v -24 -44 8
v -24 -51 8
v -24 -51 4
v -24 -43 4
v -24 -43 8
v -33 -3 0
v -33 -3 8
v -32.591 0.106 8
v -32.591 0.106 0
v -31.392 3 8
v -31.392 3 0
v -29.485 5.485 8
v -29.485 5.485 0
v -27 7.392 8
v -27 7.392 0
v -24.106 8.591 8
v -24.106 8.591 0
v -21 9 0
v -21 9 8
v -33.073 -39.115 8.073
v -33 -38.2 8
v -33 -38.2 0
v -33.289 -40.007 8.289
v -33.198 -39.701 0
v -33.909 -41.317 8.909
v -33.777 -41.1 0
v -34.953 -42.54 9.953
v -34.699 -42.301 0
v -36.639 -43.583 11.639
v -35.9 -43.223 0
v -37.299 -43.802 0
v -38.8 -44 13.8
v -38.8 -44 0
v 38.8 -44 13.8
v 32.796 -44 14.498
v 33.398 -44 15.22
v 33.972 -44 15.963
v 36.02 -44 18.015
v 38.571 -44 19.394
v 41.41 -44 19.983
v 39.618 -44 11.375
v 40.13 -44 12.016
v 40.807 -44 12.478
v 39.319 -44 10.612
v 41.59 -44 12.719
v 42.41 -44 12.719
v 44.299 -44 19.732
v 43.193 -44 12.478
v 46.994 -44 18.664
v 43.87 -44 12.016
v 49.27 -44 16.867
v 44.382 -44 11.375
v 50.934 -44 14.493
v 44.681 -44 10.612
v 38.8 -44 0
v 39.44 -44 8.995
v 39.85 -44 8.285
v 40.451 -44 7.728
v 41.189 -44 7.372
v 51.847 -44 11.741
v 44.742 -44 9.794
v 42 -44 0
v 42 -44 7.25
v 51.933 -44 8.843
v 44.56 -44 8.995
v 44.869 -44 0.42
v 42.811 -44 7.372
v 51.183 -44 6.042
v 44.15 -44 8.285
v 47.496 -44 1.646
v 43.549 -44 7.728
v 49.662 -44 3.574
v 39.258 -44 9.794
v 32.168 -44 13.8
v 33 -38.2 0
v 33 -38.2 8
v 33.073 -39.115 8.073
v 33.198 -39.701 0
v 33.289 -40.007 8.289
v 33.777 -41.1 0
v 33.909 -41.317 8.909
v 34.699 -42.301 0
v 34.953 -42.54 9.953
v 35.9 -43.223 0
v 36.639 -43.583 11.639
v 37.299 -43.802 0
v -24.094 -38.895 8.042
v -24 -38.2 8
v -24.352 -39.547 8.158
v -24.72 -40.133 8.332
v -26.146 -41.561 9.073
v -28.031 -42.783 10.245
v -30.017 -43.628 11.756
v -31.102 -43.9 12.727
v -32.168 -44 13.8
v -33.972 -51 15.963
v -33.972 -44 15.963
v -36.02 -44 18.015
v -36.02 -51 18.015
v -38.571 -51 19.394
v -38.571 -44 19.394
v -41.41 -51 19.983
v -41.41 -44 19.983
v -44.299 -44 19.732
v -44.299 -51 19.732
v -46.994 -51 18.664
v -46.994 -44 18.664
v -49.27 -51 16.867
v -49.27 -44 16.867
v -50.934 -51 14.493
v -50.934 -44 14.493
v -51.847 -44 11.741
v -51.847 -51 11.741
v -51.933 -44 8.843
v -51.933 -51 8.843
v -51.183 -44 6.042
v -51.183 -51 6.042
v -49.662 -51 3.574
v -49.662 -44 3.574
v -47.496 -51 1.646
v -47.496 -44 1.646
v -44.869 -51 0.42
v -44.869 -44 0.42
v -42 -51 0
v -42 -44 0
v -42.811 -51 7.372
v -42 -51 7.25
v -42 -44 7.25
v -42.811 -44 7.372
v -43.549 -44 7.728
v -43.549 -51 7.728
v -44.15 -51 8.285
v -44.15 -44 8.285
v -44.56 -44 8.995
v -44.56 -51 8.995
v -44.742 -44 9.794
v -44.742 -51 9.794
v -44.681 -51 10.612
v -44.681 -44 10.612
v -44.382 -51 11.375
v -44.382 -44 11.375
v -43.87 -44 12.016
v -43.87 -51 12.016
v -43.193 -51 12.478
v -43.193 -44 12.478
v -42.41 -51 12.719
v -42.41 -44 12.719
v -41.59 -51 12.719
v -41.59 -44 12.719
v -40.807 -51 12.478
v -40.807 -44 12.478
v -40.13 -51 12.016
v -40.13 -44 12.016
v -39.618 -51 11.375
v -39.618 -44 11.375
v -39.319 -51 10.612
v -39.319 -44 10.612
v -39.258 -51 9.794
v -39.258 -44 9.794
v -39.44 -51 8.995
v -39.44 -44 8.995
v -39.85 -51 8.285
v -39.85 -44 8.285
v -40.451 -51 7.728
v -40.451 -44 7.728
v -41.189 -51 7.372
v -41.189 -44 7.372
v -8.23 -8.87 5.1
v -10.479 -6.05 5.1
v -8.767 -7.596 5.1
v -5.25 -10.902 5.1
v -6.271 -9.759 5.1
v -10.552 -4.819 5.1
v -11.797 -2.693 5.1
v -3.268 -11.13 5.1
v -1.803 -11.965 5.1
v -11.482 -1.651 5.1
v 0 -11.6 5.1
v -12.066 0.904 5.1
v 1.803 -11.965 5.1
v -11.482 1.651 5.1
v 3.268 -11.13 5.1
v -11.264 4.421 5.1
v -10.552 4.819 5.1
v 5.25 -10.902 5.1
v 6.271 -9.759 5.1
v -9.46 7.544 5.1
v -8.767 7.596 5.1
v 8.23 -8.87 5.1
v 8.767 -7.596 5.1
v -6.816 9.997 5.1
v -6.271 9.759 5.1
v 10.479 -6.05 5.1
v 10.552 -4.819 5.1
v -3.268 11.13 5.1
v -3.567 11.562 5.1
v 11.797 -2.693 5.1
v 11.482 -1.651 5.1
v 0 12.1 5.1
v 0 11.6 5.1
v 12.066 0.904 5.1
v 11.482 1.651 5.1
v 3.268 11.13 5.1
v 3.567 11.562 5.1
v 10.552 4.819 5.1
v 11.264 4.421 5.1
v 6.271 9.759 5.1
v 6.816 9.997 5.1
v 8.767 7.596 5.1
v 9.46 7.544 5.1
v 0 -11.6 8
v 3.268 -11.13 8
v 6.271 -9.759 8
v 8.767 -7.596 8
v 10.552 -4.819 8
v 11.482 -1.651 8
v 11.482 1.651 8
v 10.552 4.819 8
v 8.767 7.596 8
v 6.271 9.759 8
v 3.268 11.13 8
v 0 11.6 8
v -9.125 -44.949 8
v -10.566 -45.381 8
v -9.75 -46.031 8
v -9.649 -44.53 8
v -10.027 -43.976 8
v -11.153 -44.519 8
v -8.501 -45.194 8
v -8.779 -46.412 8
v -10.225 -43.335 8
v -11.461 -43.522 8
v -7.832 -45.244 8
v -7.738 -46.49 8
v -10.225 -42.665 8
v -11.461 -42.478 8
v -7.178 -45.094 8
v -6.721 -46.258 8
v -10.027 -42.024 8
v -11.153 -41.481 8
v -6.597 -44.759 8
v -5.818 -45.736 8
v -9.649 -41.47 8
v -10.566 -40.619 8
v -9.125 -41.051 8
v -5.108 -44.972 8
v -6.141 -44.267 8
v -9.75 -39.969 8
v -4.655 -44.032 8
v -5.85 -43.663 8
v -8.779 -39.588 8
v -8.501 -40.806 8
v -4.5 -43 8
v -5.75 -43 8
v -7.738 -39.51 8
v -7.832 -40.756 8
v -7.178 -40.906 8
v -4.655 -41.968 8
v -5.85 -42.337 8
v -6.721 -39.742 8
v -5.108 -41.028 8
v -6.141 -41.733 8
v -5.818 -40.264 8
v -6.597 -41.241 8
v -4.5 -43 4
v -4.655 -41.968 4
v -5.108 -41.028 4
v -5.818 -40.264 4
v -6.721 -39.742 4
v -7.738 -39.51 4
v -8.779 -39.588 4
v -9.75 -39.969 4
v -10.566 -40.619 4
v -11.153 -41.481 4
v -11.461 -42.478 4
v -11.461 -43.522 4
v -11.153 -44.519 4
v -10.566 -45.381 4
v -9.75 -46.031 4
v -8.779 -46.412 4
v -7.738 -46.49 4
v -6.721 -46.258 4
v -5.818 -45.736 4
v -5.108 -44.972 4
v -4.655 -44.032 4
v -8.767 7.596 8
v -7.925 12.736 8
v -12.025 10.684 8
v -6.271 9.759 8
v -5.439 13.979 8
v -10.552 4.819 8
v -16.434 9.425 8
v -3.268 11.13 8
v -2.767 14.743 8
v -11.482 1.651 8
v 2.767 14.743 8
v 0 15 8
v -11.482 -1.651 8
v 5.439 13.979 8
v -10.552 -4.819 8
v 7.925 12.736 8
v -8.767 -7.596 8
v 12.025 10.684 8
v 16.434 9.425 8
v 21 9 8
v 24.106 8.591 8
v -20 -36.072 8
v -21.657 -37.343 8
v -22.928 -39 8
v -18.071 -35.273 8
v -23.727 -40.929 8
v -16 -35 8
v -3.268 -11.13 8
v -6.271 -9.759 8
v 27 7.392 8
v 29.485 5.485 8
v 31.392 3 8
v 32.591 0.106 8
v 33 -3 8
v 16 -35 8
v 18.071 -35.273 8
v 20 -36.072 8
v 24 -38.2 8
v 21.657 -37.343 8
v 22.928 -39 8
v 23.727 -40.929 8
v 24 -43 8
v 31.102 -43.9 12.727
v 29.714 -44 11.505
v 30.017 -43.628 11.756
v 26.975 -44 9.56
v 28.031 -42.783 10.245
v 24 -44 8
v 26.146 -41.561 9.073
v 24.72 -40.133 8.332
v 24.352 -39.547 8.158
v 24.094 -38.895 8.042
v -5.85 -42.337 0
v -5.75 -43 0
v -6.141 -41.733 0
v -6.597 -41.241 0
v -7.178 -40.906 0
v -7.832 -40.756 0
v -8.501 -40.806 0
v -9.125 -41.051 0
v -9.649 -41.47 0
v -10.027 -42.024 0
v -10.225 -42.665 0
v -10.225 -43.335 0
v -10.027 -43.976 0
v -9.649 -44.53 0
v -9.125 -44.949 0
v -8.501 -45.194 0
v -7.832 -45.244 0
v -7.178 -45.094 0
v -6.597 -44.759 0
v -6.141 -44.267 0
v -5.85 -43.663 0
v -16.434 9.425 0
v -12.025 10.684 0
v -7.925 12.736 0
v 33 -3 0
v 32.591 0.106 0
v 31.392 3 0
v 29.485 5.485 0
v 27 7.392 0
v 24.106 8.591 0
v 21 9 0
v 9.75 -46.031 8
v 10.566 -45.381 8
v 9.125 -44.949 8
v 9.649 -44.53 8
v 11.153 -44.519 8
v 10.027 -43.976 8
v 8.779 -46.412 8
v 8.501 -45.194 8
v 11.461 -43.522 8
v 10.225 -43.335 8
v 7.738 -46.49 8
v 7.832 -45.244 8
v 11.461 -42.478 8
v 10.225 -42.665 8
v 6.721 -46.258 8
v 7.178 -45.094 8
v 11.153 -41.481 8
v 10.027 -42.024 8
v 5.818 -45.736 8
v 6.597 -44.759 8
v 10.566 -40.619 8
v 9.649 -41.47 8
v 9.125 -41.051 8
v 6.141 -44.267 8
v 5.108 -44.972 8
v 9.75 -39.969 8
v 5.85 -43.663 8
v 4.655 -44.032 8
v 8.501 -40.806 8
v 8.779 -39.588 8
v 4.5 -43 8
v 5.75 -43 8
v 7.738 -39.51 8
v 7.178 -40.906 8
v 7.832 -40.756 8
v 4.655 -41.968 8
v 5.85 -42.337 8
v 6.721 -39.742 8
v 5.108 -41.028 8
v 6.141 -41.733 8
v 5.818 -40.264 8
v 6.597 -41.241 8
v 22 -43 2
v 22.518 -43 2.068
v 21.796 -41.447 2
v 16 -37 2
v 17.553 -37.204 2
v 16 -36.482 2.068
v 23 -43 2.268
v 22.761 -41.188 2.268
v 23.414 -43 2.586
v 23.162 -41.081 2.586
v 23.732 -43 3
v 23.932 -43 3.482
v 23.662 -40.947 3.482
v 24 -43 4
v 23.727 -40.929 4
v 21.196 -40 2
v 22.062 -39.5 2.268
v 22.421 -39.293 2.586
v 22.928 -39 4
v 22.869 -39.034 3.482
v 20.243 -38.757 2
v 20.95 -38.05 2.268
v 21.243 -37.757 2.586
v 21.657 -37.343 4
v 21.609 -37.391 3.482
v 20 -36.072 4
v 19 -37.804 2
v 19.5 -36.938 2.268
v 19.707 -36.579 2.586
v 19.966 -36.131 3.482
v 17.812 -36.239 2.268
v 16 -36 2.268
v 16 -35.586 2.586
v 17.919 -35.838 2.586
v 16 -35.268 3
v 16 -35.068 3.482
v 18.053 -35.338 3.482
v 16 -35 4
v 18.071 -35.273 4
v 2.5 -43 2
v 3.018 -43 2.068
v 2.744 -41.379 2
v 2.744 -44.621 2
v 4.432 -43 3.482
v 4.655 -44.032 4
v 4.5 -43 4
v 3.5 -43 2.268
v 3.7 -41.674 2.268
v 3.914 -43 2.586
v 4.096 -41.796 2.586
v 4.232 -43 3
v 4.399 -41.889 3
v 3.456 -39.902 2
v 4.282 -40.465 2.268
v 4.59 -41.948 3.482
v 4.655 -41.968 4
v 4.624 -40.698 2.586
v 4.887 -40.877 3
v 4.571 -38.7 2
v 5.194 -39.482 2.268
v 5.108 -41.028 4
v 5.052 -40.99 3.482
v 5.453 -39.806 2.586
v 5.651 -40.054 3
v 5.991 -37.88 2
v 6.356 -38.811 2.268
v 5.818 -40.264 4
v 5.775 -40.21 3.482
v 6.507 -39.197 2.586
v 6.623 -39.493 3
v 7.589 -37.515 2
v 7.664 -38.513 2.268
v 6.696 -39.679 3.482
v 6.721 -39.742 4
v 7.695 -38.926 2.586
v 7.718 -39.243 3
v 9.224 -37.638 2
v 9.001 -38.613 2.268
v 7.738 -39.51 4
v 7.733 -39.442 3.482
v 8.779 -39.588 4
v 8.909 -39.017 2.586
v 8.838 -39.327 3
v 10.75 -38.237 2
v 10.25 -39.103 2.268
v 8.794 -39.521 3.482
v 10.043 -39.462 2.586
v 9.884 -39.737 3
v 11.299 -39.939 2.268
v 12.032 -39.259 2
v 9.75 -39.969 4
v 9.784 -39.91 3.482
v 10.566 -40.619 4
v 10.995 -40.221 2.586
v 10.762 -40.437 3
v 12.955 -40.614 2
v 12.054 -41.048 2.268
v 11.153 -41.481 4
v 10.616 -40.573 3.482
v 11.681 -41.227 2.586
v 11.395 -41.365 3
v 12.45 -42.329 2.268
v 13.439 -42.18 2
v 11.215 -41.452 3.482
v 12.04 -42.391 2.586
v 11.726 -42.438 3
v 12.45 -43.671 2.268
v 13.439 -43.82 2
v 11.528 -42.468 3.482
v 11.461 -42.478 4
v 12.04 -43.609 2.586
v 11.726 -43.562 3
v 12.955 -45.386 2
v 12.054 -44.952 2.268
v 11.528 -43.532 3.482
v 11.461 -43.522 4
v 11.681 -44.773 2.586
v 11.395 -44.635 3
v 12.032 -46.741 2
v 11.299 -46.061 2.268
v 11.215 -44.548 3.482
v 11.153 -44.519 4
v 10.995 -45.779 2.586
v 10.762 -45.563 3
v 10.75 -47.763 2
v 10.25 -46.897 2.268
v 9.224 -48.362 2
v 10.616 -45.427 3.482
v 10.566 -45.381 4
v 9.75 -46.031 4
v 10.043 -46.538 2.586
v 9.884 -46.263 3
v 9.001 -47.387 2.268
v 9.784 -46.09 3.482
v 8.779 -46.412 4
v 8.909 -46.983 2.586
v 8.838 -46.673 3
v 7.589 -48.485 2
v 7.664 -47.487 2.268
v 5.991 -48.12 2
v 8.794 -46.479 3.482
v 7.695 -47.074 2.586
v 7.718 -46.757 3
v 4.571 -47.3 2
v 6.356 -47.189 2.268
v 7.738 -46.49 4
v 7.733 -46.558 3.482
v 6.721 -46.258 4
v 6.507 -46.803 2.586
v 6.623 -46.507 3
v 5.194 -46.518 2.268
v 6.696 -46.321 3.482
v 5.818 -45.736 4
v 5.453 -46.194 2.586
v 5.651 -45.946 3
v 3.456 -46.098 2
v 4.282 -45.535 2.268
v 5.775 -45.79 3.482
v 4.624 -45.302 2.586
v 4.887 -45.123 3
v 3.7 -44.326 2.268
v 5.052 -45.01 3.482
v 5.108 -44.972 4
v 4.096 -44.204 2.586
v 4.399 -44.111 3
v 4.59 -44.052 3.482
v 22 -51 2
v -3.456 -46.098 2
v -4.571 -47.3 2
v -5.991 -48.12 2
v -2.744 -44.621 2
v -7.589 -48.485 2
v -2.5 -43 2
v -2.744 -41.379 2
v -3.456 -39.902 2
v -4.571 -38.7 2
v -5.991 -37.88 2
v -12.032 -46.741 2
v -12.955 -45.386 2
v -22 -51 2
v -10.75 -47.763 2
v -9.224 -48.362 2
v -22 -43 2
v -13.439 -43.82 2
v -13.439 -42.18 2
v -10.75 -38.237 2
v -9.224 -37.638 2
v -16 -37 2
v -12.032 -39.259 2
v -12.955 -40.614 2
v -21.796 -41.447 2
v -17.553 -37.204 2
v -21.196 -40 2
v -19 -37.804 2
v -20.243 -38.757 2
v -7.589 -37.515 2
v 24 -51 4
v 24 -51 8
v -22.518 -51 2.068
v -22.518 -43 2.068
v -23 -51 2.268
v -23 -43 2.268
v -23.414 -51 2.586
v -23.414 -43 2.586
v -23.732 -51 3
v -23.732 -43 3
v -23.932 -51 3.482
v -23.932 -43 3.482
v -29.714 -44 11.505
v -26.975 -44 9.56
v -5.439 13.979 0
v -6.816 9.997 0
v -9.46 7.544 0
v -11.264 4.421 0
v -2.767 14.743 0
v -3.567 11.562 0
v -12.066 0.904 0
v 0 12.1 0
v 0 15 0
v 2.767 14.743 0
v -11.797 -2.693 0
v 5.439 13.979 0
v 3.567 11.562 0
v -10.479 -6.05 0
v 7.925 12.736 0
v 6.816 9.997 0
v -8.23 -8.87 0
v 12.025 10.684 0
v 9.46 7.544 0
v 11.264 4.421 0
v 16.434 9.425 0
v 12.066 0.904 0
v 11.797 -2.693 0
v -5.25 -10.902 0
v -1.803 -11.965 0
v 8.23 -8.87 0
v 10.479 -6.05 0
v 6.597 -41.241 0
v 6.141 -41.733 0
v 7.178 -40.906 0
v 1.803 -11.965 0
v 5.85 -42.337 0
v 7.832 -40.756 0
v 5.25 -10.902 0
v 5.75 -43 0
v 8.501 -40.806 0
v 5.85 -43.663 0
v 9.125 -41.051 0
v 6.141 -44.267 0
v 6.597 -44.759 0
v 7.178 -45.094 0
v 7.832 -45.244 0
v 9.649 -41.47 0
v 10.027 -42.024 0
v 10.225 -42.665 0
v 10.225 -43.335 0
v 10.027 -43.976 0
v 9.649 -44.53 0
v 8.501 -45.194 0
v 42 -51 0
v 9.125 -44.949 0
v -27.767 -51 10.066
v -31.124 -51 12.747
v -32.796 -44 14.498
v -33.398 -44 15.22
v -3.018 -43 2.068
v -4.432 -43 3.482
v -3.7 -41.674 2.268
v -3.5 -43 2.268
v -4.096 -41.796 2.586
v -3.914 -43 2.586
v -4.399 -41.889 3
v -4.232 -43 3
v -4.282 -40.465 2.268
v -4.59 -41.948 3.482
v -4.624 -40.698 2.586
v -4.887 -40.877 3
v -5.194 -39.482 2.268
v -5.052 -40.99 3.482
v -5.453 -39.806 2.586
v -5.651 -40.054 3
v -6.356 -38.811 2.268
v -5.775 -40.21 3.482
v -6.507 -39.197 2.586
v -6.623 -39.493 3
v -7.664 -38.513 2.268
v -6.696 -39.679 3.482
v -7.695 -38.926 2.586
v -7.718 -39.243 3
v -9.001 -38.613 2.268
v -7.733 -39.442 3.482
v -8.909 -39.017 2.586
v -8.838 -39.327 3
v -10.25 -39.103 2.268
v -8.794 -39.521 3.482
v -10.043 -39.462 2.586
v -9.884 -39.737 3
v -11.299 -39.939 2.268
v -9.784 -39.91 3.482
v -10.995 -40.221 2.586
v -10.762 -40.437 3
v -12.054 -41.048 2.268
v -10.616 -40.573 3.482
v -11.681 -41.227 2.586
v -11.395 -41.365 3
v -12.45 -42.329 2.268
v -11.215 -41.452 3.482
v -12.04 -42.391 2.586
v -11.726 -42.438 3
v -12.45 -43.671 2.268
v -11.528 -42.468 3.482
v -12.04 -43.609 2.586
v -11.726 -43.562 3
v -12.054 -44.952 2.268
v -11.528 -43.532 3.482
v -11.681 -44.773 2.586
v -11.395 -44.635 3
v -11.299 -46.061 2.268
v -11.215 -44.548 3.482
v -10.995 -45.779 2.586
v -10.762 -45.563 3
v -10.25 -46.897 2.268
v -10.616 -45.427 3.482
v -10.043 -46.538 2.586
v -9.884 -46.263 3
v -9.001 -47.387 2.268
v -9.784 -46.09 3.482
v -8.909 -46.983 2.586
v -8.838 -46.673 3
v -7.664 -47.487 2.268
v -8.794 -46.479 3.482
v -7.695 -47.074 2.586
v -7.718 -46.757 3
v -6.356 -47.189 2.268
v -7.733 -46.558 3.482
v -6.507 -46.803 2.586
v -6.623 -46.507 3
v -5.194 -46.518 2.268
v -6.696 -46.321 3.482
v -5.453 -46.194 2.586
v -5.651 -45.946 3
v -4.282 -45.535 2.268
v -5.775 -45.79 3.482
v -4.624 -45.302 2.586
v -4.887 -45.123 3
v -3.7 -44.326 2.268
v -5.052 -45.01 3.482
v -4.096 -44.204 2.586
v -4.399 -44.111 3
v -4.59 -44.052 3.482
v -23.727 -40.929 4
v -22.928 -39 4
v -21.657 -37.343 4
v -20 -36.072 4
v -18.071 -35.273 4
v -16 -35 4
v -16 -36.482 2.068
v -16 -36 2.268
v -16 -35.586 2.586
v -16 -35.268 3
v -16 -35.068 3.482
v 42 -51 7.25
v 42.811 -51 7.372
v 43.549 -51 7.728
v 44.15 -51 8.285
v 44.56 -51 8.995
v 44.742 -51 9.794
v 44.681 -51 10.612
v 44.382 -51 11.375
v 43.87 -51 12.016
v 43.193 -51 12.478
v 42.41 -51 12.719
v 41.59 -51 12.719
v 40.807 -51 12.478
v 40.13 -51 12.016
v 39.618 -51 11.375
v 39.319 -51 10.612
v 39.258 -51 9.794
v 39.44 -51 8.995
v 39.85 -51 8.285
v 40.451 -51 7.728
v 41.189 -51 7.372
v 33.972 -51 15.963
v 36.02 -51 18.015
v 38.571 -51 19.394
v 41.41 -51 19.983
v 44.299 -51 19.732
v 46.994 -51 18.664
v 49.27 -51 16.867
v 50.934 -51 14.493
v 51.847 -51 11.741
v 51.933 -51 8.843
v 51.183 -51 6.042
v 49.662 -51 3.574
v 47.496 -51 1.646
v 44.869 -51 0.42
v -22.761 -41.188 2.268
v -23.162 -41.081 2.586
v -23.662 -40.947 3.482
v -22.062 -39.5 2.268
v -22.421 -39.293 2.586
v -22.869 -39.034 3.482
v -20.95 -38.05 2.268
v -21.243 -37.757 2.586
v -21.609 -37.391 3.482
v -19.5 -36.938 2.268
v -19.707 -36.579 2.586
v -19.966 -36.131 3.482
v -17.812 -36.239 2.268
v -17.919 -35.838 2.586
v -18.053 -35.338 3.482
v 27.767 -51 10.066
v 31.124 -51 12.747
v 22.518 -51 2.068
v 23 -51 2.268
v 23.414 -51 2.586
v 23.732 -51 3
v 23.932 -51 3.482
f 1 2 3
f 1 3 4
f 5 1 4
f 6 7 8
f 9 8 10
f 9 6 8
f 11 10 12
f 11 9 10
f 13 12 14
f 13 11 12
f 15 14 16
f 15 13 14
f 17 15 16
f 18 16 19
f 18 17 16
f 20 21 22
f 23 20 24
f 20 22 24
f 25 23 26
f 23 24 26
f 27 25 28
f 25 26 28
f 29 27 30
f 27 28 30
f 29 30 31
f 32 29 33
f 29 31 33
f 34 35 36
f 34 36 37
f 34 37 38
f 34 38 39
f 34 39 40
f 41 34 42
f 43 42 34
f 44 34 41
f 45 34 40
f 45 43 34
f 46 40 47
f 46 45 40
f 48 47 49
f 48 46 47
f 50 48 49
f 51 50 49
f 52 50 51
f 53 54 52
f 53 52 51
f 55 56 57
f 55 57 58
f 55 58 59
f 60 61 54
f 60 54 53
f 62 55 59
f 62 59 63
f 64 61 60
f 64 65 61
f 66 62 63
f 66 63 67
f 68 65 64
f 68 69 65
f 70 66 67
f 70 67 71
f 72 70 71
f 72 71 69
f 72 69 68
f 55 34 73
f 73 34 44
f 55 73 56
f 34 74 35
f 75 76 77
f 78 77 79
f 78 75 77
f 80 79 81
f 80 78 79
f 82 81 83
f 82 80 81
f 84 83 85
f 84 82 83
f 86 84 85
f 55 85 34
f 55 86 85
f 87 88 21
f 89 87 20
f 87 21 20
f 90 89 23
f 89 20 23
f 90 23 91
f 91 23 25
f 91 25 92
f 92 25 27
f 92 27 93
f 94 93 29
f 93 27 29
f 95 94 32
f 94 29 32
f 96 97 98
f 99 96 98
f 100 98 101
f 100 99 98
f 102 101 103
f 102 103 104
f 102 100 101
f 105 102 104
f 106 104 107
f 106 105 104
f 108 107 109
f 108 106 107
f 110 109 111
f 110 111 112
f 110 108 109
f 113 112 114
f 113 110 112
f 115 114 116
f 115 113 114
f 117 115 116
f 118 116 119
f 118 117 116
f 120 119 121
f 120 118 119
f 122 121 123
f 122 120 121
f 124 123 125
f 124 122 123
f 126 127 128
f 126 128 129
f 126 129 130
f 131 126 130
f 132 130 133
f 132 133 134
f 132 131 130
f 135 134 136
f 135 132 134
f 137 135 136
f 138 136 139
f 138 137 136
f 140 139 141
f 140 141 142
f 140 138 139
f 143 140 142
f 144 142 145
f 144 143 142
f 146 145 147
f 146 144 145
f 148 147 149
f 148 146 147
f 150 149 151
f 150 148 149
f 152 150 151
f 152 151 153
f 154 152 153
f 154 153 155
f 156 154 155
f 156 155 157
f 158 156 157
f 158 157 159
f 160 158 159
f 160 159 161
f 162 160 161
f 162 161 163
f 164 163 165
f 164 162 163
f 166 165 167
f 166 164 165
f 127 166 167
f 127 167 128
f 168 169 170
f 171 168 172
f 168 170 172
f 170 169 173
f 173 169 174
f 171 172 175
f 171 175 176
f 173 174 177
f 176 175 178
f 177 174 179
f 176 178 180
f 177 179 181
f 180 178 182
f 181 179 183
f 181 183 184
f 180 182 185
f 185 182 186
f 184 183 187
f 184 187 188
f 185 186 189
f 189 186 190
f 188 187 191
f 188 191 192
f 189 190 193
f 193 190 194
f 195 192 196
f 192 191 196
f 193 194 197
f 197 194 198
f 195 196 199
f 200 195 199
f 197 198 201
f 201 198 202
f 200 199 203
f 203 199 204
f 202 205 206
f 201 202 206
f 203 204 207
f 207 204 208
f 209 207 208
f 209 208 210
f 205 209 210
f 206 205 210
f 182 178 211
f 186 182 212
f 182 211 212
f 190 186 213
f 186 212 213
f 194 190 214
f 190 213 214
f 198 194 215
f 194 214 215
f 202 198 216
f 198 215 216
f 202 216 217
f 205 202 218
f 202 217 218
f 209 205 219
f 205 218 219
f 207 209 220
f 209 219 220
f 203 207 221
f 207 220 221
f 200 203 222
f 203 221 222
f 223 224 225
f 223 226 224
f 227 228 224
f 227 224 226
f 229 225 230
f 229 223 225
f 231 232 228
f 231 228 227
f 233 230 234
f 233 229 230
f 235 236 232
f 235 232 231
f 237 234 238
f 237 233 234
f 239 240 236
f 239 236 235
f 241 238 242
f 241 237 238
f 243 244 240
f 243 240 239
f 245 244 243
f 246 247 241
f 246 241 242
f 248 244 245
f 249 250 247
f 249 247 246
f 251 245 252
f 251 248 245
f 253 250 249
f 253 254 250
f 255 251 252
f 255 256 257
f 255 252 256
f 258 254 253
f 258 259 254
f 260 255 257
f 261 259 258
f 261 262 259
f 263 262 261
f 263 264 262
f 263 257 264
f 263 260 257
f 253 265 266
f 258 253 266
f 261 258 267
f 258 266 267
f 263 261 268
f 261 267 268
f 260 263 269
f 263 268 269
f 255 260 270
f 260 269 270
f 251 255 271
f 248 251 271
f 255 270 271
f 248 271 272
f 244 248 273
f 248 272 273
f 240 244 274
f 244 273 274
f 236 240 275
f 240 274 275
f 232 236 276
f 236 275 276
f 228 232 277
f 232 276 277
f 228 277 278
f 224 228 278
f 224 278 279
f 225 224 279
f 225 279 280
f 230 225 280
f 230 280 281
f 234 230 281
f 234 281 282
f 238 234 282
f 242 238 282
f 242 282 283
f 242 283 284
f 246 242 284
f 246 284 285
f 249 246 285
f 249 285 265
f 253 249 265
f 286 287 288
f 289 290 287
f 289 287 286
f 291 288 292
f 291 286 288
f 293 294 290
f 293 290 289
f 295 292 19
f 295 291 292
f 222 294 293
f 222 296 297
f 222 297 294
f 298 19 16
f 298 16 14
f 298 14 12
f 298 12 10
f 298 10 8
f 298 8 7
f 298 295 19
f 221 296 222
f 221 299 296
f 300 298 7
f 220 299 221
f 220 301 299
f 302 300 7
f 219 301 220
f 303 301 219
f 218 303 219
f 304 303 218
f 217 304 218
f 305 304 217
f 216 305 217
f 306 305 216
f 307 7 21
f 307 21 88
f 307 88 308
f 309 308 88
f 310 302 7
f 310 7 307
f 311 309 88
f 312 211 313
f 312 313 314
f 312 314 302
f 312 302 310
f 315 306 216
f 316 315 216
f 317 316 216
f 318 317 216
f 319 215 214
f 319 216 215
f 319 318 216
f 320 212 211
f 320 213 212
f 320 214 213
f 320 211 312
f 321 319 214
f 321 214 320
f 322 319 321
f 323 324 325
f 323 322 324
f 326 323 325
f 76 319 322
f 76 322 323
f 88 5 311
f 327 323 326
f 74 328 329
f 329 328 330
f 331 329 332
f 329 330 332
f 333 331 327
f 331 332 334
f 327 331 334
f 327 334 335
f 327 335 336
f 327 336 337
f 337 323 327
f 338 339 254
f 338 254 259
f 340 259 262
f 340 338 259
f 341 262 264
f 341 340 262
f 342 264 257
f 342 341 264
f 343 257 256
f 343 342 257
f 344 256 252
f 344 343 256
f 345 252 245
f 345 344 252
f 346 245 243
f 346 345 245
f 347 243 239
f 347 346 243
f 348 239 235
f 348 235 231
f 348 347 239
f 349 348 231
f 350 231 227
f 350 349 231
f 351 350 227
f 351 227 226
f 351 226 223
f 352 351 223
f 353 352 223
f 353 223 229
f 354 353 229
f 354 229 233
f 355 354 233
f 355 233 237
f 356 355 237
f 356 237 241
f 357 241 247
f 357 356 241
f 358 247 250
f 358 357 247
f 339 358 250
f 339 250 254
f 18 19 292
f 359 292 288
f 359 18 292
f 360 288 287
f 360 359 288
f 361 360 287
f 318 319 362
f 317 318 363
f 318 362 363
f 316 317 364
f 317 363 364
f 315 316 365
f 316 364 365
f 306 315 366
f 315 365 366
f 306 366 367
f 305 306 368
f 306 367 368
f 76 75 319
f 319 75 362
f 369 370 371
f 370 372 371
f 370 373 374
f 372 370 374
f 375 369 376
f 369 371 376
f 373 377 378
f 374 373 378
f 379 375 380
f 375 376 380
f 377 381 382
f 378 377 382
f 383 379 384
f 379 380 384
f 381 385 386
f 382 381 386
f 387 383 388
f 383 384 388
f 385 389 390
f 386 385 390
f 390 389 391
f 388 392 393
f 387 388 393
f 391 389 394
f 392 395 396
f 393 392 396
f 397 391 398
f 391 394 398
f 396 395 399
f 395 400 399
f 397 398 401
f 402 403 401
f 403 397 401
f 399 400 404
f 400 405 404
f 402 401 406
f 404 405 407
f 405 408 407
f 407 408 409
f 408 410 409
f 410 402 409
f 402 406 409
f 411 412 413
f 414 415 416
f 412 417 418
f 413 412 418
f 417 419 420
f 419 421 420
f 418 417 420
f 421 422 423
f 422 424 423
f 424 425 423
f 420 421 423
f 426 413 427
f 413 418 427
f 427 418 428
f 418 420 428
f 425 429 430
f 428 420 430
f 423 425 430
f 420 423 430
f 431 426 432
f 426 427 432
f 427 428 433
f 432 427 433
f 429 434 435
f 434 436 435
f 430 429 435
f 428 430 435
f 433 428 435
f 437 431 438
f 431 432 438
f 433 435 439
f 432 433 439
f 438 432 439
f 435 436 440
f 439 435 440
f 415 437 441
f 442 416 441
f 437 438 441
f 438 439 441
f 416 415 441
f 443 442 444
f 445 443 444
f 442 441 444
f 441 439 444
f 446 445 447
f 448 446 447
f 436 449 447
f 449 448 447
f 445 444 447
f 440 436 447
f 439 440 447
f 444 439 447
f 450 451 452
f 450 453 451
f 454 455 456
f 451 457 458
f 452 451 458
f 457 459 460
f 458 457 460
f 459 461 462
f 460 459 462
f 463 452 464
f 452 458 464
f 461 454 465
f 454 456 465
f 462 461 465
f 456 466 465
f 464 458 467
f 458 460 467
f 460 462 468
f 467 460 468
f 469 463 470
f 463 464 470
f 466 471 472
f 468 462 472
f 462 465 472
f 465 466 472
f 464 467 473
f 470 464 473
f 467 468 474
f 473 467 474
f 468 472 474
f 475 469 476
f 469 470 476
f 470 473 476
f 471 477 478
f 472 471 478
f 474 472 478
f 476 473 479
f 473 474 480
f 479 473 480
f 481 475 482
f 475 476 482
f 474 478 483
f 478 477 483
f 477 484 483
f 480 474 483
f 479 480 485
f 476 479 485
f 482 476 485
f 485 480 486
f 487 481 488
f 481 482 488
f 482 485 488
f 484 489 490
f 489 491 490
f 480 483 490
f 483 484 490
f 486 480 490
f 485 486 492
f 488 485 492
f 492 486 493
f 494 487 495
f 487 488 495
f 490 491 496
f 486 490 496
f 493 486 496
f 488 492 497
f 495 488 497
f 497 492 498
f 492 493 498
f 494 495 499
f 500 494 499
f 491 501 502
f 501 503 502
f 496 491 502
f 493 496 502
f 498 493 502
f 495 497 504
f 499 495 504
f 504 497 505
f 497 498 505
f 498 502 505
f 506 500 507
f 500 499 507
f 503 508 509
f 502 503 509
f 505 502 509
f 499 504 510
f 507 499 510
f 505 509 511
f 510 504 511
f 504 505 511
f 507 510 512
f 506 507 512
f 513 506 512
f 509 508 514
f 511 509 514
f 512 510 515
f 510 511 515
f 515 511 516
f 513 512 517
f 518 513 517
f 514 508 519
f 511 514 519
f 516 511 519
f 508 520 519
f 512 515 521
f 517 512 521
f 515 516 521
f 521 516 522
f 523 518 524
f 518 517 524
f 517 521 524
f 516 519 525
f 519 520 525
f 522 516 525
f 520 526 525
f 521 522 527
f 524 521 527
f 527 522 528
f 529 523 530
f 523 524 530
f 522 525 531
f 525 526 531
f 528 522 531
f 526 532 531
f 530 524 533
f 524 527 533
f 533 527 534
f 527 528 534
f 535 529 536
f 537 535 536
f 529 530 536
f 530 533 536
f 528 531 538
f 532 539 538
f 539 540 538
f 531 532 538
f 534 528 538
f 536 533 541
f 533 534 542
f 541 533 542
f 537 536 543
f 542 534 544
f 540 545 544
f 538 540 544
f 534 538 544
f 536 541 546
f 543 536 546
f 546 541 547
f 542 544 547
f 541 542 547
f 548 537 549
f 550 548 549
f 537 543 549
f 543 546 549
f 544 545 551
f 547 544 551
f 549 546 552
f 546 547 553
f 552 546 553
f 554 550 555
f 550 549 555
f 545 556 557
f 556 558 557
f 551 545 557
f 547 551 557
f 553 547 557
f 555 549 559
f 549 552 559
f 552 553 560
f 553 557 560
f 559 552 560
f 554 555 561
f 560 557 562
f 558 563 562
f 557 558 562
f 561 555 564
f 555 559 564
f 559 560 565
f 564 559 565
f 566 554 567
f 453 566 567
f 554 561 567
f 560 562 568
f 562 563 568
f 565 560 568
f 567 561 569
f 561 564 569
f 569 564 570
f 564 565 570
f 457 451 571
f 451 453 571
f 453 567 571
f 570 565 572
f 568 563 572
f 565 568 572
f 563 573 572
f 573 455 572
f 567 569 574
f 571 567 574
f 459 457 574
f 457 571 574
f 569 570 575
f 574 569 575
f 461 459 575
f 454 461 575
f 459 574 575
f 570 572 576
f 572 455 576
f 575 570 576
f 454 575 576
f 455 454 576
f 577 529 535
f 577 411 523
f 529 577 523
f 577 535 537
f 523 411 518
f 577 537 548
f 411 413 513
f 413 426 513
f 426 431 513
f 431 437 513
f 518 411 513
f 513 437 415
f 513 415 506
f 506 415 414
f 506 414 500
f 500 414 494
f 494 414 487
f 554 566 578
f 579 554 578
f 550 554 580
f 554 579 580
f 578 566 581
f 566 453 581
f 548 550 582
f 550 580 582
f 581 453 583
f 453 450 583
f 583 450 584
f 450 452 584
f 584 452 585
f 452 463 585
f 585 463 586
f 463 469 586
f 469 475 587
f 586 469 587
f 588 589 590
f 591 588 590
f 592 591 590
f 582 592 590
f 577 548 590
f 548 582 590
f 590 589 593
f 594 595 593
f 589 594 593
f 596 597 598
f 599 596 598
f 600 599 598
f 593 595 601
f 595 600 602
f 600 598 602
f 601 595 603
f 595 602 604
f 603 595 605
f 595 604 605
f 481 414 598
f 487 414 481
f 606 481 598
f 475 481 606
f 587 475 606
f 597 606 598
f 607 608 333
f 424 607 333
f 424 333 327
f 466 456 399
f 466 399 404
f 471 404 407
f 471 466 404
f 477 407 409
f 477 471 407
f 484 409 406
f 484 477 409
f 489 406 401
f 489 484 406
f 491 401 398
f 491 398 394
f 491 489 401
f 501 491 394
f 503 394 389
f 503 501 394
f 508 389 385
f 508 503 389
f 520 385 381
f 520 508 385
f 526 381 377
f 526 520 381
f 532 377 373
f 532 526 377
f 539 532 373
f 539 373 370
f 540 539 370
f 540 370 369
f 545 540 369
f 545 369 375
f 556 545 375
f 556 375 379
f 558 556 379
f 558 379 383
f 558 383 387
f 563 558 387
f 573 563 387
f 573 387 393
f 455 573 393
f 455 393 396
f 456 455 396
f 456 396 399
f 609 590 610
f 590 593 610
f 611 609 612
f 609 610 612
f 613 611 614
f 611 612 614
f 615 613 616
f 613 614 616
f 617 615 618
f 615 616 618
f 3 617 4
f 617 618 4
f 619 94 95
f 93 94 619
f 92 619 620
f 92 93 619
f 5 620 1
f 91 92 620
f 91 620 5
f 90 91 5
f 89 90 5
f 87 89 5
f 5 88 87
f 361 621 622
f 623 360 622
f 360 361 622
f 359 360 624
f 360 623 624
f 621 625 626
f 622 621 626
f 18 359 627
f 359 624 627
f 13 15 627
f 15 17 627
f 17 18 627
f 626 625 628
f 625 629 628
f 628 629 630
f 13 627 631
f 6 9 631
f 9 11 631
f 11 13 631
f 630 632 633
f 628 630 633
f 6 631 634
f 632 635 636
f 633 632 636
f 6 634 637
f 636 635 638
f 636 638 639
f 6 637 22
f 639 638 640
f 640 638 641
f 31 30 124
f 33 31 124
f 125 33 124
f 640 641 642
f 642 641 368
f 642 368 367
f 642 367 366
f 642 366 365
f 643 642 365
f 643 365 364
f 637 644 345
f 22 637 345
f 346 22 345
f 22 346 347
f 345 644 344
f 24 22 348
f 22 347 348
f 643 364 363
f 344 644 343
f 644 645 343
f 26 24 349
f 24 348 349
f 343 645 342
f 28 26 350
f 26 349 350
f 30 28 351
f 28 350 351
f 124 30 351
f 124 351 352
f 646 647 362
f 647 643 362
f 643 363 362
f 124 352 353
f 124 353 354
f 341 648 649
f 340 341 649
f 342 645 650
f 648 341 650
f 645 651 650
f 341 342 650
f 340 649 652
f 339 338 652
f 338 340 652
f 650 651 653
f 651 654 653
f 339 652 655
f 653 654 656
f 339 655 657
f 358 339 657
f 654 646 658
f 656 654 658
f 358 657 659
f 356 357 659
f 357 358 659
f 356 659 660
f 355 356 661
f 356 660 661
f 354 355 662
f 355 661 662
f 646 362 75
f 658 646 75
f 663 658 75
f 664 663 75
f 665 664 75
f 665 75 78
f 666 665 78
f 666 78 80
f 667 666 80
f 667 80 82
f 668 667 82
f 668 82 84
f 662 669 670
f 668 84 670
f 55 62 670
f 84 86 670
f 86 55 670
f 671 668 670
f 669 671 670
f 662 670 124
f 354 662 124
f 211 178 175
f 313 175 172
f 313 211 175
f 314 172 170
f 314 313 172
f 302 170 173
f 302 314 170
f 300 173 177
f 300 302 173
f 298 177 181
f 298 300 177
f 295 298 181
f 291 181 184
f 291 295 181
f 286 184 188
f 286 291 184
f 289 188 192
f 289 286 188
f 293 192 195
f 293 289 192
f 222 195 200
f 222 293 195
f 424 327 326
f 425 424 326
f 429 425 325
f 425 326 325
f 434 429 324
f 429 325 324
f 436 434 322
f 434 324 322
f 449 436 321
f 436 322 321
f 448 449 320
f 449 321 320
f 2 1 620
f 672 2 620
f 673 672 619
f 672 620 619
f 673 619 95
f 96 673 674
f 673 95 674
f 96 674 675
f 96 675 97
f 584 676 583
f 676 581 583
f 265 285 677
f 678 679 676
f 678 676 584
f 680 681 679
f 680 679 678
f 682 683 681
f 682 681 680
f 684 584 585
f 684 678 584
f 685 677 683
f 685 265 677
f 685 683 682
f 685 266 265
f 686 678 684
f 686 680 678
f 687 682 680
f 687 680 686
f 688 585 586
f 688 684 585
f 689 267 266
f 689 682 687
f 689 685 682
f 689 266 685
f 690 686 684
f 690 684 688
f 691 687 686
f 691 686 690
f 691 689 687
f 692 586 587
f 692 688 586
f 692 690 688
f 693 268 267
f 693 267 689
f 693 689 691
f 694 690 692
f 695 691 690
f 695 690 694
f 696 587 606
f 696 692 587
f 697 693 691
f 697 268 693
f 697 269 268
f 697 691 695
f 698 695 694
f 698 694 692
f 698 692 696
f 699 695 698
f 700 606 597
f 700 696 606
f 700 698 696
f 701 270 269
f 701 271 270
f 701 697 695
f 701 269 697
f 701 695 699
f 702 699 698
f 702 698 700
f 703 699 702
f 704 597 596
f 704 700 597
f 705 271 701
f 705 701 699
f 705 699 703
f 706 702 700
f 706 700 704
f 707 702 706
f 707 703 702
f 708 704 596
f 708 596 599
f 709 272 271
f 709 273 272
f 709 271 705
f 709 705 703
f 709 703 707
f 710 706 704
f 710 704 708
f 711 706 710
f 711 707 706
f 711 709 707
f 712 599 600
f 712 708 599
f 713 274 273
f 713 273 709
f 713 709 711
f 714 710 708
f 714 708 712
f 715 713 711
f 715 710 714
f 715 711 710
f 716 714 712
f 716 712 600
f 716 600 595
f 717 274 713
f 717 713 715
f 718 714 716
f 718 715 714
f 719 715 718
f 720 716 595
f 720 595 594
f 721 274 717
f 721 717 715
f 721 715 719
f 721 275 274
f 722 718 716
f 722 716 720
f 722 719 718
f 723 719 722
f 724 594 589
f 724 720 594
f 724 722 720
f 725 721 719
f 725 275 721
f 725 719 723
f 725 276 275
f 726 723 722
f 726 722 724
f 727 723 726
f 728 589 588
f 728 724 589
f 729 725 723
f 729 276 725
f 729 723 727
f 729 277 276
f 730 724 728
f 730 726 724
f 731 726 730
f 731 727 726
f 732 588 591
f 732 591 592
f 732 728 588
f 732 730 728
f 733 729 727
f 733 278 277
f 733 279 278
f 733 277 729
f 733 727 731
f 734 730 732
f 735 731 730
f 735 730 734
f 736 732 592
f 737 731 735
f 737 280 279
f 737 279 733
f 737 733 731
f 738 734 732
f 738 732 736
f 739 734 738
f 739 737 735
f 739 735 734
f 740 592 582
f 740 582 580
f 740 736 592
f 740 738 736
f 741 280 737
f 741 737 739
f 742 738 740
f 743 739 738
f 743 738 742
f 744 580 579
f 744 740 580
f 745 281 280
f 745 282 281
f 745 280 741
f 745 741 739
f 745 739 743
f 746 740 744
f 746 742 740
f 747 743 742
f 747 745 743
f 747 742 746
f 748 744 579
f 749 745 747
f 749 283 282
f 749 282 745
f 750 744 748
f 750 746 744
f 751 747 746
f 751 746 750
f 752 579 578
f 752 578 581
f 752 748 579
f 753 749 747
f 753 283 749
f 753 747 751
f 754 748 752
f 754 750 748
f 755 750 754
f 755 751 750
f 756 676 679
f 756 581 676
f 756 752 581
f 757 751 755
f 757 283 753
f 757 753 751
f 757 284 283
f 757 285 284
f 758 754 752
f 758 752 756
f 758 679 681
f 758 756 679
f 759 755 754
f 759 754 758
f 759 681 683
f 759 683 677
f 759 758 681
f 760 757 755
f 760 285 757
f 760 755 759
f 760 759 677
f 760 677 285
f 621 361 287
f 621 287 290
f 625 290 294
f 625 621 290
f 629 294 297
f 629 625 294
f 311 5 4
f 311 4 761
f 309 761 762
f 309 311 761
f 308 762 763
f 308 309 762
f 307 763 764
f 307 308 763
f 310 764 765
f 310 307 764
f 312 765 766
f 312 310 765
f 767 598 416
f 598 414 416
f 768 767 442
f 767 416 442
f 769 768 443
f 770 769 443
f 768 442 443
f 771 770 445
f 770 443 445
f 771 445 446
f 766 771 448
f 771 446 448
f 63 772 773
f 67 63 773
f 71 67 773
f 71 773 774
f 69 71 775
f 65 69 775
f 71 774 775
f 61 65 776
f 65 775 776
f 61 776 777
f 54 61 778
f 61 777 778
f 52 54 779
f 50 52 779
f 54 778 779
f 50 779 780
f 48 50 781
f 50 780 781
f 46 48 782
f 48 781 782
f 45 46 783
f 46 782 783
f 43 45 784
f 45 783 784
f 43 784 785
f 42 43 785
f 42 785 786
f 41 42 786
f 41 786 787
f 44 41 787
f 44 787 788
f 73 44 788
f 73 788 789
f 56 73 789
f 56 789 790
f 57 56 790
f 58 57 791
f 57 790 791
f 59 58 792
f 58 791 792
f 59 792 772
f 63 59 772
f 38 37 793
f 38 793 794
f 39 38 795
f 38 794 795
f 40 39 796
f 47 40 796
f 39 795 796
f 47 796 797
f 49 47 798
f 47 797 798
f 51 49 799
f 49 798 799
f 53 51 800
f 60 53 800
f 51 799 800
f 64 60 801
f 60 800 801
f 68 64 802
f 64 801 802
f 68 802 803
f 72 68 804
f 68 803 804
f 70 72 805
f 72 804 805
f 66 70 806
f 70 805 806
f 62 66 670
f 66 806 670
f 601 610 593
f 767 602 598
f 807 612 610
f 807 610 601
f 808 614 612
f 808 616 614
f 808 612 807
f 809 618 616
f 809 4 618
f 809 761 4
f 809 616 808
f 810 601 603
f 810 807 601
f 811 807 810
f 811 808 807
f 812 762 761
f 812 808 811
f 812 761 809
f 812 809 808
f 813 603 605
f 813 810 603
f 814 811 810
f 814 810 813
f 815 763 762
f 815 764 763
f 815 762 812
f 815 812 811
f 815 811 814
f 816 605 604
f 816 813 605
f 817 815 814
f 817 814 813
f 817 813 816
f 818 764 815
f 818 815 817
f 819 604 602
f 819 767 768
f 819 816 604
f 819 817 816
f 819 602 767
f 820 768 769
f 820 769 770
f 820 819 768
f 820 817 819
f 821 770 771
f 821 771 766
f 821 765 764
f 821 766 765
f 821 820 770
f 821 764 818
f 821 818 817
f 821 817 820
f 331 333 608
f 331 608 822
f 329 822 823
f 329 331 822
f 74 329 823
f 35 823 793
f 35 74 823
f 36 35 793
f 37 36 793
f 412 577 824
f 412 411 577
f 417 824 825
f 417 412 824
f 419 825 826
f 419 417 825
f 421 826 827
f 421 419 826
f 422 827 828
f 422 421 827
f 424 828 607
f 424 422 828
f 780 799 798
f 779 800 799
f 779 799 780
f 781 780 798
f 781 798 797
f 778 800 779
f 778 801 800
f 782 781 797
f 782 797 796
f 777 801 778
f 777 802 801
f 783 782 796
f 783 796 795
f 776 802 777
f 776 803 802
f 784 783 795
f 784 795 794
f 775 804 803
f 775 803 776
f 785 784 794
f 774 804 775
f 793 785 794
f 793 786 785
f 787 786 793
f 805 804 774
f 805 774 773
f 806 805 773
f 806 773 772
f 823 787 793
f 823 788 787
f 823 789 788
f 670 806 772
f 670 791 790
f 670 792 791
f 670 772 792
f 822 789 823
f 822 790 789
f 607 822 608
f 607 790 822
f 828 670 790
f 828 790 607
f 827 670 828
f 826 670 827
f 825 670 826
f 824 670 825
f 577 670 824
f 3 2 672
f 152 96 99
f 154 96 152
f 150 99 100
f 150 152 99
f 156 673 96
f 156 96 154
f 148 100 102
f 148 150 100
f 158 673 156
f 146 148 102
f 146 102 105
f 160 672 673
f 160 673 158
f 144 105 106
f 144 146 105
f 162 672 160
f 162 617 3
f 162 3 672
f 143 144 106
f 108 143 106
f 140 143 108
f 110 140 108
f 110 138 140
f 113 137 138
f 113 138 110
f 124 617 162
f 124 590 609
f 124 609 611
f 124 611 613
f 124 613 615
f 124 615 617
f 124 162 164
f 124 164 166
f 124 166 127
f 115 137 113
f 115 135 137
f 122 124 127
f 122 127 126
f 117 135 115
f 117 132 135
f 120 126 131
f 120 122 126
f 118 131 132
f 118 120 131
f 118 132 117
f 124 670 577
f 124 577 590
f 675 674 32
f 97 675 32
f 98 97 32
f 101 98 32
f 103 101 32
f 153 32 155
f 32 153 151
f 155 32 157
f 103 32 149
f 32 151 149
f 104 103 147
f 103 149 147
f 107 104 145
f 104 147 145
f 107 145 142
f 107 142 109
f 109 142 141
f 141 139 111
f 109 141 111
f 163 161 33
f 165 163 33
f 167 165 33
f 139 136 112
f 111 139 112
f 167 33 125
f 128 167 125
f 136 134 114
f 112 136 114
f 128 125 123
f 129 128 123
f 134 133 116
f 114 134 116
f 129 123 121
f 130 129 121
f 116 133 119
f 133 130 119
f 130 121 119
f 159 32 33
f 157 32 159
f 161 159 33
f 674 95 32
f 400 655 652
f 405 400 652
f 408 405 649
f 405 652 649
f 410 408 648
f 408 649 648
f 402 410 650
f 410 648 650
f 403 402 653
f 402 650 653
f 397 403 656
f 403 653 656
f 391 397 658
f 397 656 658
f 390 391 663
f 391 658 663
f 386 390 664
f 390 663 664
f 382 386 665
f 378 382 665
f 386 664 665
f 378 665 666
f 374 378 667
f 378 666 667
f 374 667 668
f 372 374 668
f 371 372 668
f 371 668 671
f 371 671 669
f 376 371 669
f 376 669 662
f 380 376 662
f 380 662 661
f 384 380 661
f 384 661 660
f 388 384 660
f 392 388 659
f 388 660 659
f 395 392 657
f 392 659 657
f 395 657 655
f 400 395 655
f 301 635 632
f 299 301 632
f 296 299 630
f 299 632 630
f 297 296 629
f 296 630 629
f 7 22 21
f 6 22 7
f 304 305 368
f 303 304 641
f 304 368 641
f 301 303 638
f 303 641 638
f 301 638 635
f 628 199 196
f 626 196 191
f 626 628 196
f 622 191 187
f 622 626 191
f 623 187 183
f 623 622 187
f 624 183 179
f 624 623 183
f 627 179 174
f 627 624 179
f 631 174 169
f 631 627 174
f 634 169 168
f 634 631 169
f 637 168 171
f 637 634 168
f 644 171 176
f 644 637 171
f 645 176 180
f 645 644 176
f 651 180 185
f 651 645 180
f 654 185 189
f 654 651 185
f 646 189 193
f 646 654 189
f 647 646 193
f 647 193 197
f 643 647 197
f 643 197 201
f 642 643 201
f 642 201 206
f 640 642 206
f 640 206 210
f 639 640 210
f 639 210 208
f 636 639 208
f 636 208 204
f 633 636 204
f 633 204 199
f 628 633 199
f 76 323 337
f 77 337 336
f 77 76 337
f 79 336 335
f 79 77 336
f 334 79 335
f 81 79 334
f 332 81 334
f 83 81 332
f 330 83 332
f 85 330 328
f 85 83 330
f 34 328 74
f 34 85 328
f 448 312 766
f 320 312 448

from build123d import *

# Parameters (mm, degrees)
SKETCH1_W           = 33
SKETCH1_H           = 66
BOSS_EXTRUDE1_DEPTH = 8
SKETCH3_R           = 11.6
CUT_EXTRUDE1_DEPTH  = 62.269894728
SKETCH6_R           = 12.1
CUT_EXTRUDE2_DEPTH  = 5.1
SKETCH10_R          = 2.75
BOSS_EXTRUDE4_DEPTH = 7
CUT_EXTRUDE3_DEPTH  = 6
SKETCH12_R          = 2.75
CUT_EXTRUDE4_DEPTH  = 6
FILLET7_R           = 2
FILLET5_R           = 25
FILLET6_R           = 5.8
SKETCH13_R          = 3.5
SKETCH13_R_2        = 2.25
BOSS_EXTRUDE5_DEPTH = 8
FILLET8_R           = 2
CUT_EXTRUDE5_DEPTH  = 76.531450471


with BuildPart() as part:
    # Sketch1 → Boss-Extrude1 (new body)
    with BuildSketch(Plane.XY):
        with Locations((16.5, -18)):
            Rectangle(SKETCH1_W, SKETCH1_H)
    extrude(amount=BOSS_EXTRUDE1_DEPTH)

    # Sketch3 → Cut-Extrude1 (cut, through all)
    with BuildSketch(Plane.XY.offset(8)):
        Circle(SKETCH3_R)
    extrude(amount=-CUT_EXTRUDE1_DEPTH, mode=Mode.SUBTRACT)

    # Sketch6 → Cut-Extrude2 (cut)
    with BuildSketch(Plane(origin=(0, 0, 0), x_dir=(-1, 0, 0), z_dir=(0, 0, -1))):
        Circle(SKETCH6_R)
    extrude(amount=-CUT_EXTRUDE2_DEPTH, mode=Mode.SUBTRACT)

    # Sketch10 → Boss-Extrude4 (add)
    with BuildSketch(Plane.XZ.offset(51)):
        with BuildLine():
            Line((42, 0), (32, 0))
            Line((32, 0), (32, 10))
            ThreePointArc((32, 10), (49.071067812, 17.071067812), (42, 0))
        make_face()
        with Locations(Location((42, 10, 0), (0, 0, 270))):
            Circle(SKETCH10_R, mode=Mode.SUBTRACT)
    extrude(amount=-BOSS_EXTRUDE4_DEPTH)

    # Sketch11 → Cut-Extrude3 (cut)
    with BuildSketch(Plane.XY.offset(8)):
        with BuildLine():
            Line((0, -51), (24, -51))
            Line((24, -51), (24, -43))
            ThreePointArc((24, -43), (21.656854249, -37.343145751), (16, -35))
            Line((16, -35), (0, -35))
            Line((0, -35), (0, -51))
        make_face()
    extrude(amount=-CUT_EXTRUDE3_DEPTH, mode=Mode.SUBTRACT)

    # Sketch12 → Cut-Extrude4 (cut)
    with BuildSketch(Plane.XY.offset(2)):
        with Locations((8, -43)):
            Circle(SKETCH12_R)
    extrude(amount=-CUT_EXTRUDE4_DEPTH, mode=Mode.SUBTRACT)

    # Fillet7
    fillet7_edges = [part.edges().sort_by_distance(p)[0] for p in [
        (8, -35, 2),
        (21.656854249, -37.343145751, 2),
        (24, -47, 2),
    ]]
    fillet(fillet7_edges, radius=FILLET7_R)

    # Fillet5
    # the kernel refuses this fillet: 25 mm, written as the material it adds along each edge
    with BuildSketch(Plane(origin=(32, -44, 8), x_dir=(-1, 0, 0), z_dir=(0, -1, 0))) as fillet5_piece_1:
        with BuildLine():
            CenterArc((18.096713956, -22.870425604), FILLET5_R, 113.820244592, 29.574545381)
            Line((-1.972367441, -7.962978744), (-3.979275581, -6.472234058))
            ThreePointArc((-3.979275581, -6.472234058), (-2.5, -2), (-2.5, 0))
            Line((-2.5, 0), (0, 2.5))
            ThreePointArc((0, 2.5), (4, 2.5), (6.990328604, 2.28704256))
            Line((6.990328604, 2.28704256), (8, 0))
        make_face()
    extrude(amount=7)

    # Fillet6
    # the kernel refuses this fillet: 5.8 mm, written as the material it adds along each edge
    with BuildSketch(Plane(origin=(33, -44, 0), x_dir=(0, 1, 0), z_dir=(0, 0, 1))) as fillet6_piece_1:
        with BuildLine():
            CenterArc((FILLET6_R, -FILLET6_R), FILLET6_R, 90, 90)
            Line((0, -FILLET6_R), (0, 0))
            Line((0, 0), (FILLET6_R, 0))
        make_face()
    extrude(amount=8)
    with BuildSketch(Plane(origin=(33, -44, 8), x_dir=(0, 1, 0), z_dir=(-1, 0, 0))) as fillet6_piece_2_section:
        with BuildLine():
            CenterArc((FILLET6_R, -FILLET6_R), FILLET6_R, 90, 90)
            Line((0, -FILLET6_R), (0, 0))
            Line((0, 0), (FILLET6_R, 0))
        make_face()
    fillet6_piece_2 = extrude(amount=23.5, mode=Mode.PRIVATE)
    fillet6_piece_2 = fillet6_piece_2 - Plane(origin=(13.903286044, -44, 30.870425604), x_dir=(-1, 0, 0), z_dir=(0, 1, 0)) * Cylinder(25, 71, mode=Mode.PRIVATE)
    add(fillet6_piece_2)
    with BuildSketch(Plane(origin=(47.5, -44, 8), x_dir=(0, 1, 0), z_dir=(-1, 0, 0))) as fillet6_piece_3a_section:
        with BuildLine():
            CenterArc((FILLET6_R, -FILLET6_R), FILLET6_R, 90, 90)
            Line((0, -FILLET6_R), (0, 0))
            Line((0, 0), (FILLET6_R, 0))
        make_face()
    fillet6_piece_3a = extrude(amount=23.5, mode=Mode.PRIVATE)
    fillet6_piece_3a = fillet6_piece_3a - Plane(origin=(42, -44, 10), x_dir=(0, 0, -1), z_dir=(0, -1, 0)) * Cylinder(2.75, 71, mode=Mode.PRIVATE)
    fillet6_piece_3a = split(fillet6_piece_3a, bisect_by=Plane(origin=(33, -44, 8), z_dir=(1, 0, 0)), keep=Keep.TOP, mode=Mode.PRIVATE)
    with BuildSketch(Plane(origin=(33, -44, 0), x_dir=(0, 1, 0), z_dir=(0, 0, 1))) as fillet6_piece_3b_section:
        with BuildLine():
            CenterArc((FILLET6_R, -FILLET6_R), FILLET6_R, 90, 90)
            Line((0, -FILLET6_R), (0, 0))
            Line((0, 0), (FILLET6_R, 0))
        make_face()
    fillet6_piece_3b = extrude(amount=22.5, mode=Mode.PRIVATE)
    fillet6_piece_3b = split(fillet6_piece_3b, bisect_by=Plane(origin=(33, -44, 8), z_dir=(0, 0, 1)), keep=Keep.TOP, mode=Mode.PRIVATE)
    fillet6_piece_3b = fillet6_piece_3b & Plane(origin=(42, -44, 10), x_dir=(-1, 0, 0), z_dir=(0, -1, 0)) * Cylinder(10, 69, mode=Mode.PRIVATE)
    fillet6_piece_3 = fillet6_piece_3a & fillet6_piece_3b
    add(fillet6_piece_3)

    # Sketch13 → Boss-Extrude5 (add)
    with BuildSketch(Plane(origin=(0, 0, 0), x_dir=(-1, 0, 0), z_dir=(0, 0, -1))):
        with Locations((-8, -43)):
            Circle(SKETCH13_R)
        with Locations((-8, -43)):
            Circle(SKETCH13_R_2, mode=Mode.SUBTRACT)
    extrude(amount=-BOSS_EXTRUDE5_DEPTH)

    # Fillet8
    fillet8_edges = [part.edges().sort_by_distance(p)[0] for p in [
        (11.5, -43, 2),
    ]]
    fillet(fillet8_edges, radius=FILLET8_R)

    # Sketch15 → Cut-Extrude5 (cut, through all)
    with BuildSketch(Plane(origin=(0, 0, 0), x_dir=(-1, 0, 0), z_dir=(0, 0, -1))):
        with BuildLine():
            Line((0, 15), (-33, 15))
            Line((-33, 15), (-33, -3))
            ThreePointArc((-33, -3), (-29.485281374, 5.485281374), (-21, 9))
            ThreePointArc((-21, 9), (-14.200652085, 9.952282296), (-7.924528302, 12.735849057))
            ThreePointArc((-7.924528302, 12.735849057), (-4.120816918, 14.422859215), (0, 15))
        make_face()
    extrude(amount=-CUT_EXTRUDE5_DEPTH, mode=Mode.SUBTRACT)

    # Mirror1: part across plane


with BuildPart() as part_1:
    add(part.part)
    add(part.part.mirror(Plane(origin=(0, 15, 8), x_dir=(0, 0, 1), z_dir=(1, 0, 0))))


solid = part_1.part
